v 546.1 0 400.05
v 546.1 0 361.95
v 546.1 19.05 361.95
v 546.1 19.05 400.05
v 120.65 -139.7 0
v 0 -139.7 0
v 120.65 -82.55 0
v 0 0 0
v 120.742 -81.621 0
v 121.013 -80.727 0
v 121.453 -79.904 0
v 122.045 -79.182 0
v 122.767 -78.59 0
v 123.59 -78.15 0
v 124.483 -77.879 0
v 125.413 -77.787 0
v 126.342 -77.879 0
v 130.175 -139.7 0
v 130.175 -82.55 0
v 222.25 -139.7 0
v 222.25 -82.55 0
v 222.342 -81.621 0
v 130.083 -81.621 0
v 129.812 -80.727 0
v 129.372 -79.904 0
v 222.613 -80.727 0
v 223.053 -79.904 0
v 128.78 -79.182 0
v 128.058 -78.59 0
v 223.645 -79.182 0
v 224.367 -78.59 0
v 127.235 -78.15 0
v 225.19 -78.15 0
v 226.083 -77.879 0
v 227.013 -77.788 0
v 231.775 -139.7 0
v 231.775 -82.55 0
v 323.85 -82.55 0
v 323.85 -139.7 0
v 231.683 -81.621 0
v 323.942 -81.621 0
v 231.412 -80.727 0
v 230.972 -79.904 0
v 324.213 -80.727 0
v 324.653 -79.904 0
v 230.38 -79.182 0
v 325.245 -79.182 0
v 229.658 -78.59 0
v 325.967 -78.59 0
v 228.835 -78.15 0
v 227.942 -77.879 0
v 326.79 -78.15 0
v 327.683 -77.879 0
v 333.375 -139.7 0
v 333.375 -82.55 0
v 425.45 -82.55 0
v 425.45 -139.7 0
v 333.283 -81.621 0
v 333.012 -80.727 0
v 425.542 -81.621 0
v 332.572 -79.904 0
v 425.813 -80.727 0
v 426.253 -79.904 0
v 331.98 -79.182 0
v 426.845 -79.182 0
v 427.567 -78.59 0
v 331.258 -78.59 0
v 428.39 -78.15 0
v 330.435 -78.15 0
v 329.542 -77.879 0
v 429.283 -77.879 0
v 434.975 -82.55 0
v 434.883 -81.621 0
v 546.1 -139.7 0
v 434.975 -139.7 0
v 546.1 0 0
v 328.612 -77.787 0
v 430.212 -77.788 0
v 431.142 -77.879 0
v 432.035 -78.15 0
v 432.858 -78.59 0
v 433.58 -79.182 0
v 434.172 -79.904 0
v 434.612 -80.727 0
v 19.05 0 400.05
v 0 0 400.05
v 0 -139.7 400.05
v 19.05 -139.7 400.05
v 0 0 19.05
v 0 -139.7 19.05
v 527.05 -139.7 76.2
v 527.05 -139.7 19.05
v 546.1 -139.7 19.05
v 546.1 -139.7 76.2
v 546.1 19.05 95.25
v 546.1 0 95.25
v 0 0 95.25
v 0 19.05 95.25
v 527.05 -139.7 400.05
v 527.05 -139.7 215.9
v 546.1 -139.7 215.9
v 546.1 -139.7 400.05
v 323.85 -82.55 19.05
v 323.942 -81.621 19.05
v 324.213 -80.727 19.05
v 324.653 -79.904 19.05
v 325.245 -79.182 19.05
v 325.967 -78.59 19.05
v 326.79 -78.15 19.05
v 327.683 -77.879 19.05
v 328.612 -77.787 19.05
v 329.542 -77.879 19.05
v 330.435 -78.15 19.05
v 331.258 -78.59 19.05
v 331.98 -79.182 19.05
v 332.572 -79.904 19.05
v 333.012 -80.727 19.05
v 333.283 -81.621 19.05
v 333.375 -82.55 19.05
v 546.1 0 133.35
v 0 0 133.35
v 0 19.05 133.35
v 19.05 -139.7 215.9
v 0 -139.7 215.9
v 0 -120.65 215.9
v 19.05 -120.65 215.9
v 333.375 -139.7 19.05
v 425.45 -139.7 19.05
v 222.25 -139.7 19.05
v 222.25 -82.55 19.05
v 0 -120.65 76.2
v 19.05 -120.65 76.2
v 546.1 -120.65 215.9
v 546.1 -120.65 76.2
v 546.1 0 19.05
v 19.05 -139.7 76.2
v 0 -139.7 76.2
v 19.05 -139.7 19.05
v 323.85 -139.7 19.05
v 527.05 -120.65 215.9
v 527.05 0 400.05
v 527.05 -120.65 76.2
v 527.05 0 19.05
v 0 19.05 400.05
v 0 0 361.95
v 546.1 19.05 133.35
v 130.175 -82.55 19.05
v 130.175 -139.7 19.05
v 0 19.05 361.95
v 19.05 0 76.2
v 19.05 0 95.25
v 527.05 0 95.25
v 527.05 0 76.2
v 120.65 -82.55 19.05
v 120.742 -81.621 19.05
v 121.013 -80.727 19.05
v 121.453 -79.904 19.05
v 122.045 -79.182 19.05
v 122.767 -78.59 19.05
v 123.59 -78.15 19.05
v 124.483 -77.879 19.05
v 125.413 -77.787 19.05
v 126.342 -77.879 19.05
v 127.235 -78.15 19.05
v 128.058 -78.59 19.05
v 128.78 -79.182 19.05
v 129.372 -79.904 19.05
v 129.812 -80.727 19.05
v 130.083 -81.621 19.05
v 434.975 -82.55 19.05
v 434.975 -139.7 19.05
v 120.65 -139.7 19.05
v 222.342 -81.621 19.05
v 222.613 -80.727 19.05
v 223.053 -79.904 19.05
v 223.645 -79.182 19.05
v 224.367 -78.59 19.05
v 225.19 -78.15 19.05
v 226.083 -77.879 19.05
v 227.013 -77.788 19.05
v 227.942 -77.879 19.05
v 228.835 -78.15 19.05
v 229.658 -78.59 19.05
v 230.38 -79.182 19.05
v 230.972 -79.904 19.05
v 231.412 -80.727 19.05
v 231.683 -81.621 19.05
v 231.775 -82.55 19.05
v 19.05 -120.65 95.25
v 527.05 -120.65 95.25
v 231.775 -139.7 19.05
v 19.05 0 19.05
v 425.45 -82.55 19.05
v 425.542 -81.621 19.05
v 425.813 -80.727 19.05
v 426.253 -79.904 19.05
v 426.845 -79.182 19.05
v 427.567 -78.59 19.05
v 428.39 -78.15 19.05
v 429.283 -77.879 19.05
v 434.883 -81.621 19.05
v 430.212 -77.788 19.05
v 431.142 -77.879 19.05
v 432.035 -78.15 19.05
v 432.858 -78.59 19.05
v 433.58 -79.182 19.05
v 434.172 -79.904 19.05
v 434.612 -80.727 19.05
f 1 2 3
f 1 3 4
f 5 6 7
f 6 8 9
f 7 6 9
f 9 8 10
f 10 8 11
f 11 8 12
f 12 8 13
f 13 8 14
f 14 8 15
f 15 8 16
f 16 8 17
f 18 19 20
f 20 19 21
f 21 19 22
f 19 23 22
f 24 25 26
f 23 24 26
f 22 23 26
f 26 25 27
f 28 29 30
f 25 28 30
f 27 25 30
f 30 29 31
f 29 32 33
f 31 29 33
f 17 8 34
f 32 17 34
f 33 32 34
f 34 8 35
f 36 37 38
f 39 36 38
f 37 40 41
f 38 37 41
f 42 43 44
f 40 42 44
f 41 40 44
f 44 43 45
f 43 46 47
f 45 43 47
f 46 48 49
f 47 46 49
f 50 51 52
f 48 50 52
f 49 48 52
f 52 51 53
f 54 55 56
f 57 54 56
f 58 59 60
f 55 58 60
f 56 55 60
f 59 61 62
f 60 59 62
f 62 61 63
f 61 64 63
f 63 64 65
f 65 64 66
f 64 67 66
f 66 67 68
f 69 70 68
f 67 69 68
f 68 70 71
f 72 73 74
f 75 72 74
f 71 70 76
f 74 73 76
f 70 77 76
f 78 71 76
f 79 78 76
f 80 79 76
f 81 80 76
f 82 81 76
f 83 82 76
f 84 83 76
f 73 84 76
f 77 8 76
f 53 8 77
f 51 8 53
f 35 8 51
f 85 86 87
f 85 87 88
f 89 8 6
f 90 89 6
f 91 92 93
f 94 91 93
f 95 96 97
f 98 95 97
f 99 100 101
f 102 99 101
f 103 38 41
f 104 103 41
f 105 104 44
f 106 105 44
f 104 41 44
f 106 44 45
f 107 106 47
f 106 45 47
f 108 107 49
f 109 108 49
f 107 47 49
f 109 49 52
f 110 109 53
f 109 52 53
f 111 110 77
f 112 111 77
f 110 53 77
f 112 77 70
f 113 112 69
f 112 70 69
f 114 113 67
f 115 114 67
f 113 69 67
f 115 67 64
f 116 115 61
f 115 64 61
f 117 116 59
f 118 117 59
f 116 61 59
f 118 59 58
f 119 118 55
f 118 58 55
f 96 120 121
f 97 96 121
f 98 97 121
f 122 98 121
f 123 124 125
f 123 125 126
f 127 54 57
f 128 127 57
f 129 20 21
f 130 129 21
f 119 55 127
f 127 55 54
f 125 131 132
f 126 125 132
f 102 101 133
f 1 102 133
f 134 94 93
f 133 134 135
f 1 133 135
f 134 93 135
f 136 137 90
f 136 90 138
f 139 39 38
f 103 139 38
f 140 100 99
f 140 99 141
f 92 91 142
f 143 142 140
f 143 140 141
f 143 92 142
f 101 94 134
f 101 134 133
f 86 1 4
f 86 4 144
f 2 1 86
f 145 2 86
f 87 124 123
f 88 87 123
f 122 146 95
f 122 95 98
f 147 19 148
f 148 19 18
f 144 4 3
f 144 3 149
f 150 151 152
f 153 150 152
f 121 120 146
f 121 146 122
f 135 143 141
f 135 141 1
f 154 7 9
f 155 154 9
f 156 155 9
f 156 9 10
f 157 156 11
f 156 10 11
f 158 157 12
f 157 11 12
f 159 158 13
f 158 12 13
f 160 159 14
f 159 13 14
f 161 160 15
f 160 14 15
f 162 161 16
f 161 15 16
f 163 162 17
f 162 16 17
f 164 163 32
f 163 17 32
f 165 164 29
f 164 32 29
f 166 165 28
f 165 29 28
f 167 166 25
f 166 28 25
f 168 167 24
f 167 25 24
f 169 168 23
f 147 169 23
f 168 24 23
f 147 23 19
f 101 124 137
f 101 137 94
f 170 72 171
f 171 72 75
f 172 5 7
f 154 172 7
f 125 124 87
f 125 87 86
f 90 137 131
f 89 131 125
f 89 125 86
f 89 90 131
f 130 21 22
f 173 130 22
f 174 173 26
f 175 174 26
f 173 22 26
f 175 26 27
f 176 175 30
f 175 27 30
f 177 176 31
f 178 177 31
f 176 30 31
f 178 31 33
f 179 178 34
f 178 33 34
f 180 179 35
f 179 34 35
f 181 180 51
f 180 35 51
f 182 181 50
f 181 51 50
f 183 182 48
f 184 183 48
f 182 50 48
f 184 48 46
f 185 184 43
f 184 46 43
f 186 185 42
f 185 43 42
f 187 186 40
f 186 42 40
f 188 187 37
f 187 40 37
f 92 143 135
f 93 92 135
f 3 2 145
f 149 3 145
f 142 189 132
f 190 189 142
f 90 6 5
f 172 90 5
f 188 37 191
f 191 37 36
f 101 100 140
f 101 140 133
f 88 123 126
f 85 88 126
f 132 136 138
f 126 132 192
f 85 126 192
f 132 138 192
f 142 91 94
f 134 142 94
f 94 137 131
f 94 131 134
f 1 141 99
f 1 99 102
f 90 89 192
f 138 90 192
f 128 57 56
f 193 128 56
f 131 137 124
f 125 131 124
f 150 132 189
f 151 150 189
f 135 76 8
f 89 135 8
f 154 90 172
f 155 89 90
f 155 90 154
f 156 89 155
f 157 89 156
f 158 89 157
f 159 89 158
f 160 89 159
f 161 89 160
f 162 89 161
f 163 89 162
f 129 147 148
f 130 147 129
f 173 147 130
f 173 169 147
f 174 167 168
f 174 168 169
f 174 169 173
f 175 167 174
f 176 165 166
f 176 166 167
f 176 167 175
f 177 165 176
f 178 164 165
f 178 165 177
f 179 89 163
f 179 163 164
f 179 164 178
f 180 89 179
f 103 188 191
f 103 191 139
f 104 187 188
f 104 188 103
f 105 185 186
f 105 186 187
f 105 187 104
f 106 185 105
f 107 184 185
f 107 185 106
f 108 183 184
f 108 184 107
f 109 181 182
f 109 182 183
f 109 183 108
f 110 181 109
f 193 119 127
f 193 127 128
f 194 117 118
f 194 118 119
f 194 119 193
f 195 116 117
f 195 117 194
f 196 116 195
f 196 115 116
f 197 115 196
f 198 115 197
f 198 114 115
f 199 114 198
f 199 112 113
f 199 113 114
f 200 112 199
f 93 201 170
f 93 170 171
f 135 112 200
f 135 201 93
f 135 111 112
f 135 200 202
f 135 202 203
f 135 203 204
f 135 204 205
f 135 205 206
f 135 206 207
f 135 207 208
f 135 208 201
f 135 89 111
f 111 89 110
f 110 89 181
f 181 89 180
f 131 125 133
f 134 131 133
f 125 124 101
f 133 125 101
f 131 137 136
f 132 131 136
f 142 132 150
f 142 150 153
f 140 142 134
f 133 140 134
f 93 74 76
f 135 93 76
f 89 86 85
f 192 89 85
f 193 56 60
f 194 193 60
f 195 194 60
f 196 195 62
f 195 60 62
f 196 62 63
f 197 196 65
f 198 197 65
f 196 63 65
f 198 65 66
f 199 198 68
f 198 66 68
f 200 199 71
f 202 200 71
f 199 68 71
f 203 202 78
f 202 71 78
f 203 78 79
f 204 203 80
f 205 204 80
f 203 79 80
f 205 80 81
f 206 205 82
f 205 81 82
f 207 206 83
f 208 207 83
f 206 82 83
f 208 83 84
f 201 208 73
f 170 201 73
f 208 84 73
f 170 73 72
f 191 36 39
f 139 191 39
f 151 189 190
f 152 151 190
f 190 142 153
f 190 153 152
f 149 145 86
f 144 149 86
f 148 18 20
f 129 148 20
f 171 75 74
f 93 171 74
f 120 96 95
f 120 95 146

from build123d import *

# Parameters (mm, degrees)
F1_DEPTH = 19.05
F2_W     = 19.05
F2_H     = 139.7
F3_DEPTH = 381
F4_W     = 508
F4_H     = 19.05
F5_DEPTH = 139.7
F6_W     = 546.1
F6_H     = 139.7
F7_DEPTH = 19.05
F8_W     = 546.1
F8_H     = 38.1
F9_DEPTH = 19.05


with BuildPart() as f1:
    # F0 (on Top) → F1 (new body)
    with BuildSketch(Plane.XY):
        with BuildLine():
            Line((546.1, 0), (0, 0))
            Line((0, 0), (0, -139.7))
            Line((0, -139.7), (120.65, -139.7))
            Line((120.65, -139.7), (120.65, -82.55))
            ThreePointArc((120.65, -82.55), (125.4125, -77.7875), (130.175, -82.55))
            Line((130.175, -82.55), (130.175, -139.7))
            Line((130.175, -139.7), (222.25, -139.7))
            Line((222.25, -139.7), (222.25, -82.55))
            ThreePointArc((222.25, -82.55), (227.0125, -77.7875), (231.775, -82.55))
            Line((231.775, -82.55), (231.775, -139.7))
            Line((231.775, -139.7), (323.85, -139.7))
            Line((323.85, -139.7), (323.85, -82.55))
            ThreePointArc((323.85, -82.55), (328.6125, -77.7875), (333.375, -82.55))
            Line((333.375, -82.55), (333.375, -139.7))
            Line((333.375, -139.7), (425.45, -139.7))
            Line((425.45, -139.7), (425.45, -82.55))
            ThreePointArc((425.45, -82.55), (430.2125, -77.7875), (434.975, -82.55))
            Line((434.975, -82.55), (434.975, -139.7))
            Line((434.975, -139.7), (546.1, -139.7))
            Line((546.1, -139.7), (546.1, 0))
        make_face()
    extrude(amount=F1_DEPTH)


with BuildPart() as f3:
    # F2 (on face) → F3 (new body)
    with BuildSketch(Plane.XY.offset(19.05)):
        with Locations((536.575, -69.85)):
            Rectangle(F2_W, F2_H)
        with Locations((9.525, -69.85)):
            Rectangle(F2_W, F2_H)
    extrude(amount=F3_DEPTH)


with BuildPart() as f5:
    # F4 (on face) → F5 (new body, through all)
    with BuildSketch(Plane.XZ.offset(139.7)):
        with Locations((273.05, 85.725)):
            Rectangle(F4_W, F4_H)
    extrude(amount=-F5_DEPTH)


with BuildPart() as f7:
    # F6 (on face) → F7 (new body)
    with BuildSketch(Plane.XZ.offset(139.7)):
        with Locations((273.05, 146.05)):
            Rectangle(F6_W, F6_H)
    extrude(amount=-F7_DEPTH)


with BuildPart() as f9:
    # F8 (on face) → F9 (new body)
    with BuildSketch(Plane(origin=(0, 0, 0), x_dir=(-1, 0, 0), z_dir=(0, 1, 0))):
        with Locations((-273.05, 114.3)):
            Rectangle(F8_W, F8_H)
        with Locations((-273.05, 381)):
            Rectangle(F8_W, F8_H)
    extrude(amount=F9_DEPTH)


with BuildPart() as f3_1:
    add(f3.part)

    # F10: cut F7
    add(f7.part, mode=Mode.SUBTRACT)


with BuildPart() as f5_1:
    add(f5.part)

    # F10: cut F7
    add(f7.part, mode=Mode.SUBTRACT)


solid = Compound([f1.part, f7.part, f9.part, f3_1.part, f5_1.part])
